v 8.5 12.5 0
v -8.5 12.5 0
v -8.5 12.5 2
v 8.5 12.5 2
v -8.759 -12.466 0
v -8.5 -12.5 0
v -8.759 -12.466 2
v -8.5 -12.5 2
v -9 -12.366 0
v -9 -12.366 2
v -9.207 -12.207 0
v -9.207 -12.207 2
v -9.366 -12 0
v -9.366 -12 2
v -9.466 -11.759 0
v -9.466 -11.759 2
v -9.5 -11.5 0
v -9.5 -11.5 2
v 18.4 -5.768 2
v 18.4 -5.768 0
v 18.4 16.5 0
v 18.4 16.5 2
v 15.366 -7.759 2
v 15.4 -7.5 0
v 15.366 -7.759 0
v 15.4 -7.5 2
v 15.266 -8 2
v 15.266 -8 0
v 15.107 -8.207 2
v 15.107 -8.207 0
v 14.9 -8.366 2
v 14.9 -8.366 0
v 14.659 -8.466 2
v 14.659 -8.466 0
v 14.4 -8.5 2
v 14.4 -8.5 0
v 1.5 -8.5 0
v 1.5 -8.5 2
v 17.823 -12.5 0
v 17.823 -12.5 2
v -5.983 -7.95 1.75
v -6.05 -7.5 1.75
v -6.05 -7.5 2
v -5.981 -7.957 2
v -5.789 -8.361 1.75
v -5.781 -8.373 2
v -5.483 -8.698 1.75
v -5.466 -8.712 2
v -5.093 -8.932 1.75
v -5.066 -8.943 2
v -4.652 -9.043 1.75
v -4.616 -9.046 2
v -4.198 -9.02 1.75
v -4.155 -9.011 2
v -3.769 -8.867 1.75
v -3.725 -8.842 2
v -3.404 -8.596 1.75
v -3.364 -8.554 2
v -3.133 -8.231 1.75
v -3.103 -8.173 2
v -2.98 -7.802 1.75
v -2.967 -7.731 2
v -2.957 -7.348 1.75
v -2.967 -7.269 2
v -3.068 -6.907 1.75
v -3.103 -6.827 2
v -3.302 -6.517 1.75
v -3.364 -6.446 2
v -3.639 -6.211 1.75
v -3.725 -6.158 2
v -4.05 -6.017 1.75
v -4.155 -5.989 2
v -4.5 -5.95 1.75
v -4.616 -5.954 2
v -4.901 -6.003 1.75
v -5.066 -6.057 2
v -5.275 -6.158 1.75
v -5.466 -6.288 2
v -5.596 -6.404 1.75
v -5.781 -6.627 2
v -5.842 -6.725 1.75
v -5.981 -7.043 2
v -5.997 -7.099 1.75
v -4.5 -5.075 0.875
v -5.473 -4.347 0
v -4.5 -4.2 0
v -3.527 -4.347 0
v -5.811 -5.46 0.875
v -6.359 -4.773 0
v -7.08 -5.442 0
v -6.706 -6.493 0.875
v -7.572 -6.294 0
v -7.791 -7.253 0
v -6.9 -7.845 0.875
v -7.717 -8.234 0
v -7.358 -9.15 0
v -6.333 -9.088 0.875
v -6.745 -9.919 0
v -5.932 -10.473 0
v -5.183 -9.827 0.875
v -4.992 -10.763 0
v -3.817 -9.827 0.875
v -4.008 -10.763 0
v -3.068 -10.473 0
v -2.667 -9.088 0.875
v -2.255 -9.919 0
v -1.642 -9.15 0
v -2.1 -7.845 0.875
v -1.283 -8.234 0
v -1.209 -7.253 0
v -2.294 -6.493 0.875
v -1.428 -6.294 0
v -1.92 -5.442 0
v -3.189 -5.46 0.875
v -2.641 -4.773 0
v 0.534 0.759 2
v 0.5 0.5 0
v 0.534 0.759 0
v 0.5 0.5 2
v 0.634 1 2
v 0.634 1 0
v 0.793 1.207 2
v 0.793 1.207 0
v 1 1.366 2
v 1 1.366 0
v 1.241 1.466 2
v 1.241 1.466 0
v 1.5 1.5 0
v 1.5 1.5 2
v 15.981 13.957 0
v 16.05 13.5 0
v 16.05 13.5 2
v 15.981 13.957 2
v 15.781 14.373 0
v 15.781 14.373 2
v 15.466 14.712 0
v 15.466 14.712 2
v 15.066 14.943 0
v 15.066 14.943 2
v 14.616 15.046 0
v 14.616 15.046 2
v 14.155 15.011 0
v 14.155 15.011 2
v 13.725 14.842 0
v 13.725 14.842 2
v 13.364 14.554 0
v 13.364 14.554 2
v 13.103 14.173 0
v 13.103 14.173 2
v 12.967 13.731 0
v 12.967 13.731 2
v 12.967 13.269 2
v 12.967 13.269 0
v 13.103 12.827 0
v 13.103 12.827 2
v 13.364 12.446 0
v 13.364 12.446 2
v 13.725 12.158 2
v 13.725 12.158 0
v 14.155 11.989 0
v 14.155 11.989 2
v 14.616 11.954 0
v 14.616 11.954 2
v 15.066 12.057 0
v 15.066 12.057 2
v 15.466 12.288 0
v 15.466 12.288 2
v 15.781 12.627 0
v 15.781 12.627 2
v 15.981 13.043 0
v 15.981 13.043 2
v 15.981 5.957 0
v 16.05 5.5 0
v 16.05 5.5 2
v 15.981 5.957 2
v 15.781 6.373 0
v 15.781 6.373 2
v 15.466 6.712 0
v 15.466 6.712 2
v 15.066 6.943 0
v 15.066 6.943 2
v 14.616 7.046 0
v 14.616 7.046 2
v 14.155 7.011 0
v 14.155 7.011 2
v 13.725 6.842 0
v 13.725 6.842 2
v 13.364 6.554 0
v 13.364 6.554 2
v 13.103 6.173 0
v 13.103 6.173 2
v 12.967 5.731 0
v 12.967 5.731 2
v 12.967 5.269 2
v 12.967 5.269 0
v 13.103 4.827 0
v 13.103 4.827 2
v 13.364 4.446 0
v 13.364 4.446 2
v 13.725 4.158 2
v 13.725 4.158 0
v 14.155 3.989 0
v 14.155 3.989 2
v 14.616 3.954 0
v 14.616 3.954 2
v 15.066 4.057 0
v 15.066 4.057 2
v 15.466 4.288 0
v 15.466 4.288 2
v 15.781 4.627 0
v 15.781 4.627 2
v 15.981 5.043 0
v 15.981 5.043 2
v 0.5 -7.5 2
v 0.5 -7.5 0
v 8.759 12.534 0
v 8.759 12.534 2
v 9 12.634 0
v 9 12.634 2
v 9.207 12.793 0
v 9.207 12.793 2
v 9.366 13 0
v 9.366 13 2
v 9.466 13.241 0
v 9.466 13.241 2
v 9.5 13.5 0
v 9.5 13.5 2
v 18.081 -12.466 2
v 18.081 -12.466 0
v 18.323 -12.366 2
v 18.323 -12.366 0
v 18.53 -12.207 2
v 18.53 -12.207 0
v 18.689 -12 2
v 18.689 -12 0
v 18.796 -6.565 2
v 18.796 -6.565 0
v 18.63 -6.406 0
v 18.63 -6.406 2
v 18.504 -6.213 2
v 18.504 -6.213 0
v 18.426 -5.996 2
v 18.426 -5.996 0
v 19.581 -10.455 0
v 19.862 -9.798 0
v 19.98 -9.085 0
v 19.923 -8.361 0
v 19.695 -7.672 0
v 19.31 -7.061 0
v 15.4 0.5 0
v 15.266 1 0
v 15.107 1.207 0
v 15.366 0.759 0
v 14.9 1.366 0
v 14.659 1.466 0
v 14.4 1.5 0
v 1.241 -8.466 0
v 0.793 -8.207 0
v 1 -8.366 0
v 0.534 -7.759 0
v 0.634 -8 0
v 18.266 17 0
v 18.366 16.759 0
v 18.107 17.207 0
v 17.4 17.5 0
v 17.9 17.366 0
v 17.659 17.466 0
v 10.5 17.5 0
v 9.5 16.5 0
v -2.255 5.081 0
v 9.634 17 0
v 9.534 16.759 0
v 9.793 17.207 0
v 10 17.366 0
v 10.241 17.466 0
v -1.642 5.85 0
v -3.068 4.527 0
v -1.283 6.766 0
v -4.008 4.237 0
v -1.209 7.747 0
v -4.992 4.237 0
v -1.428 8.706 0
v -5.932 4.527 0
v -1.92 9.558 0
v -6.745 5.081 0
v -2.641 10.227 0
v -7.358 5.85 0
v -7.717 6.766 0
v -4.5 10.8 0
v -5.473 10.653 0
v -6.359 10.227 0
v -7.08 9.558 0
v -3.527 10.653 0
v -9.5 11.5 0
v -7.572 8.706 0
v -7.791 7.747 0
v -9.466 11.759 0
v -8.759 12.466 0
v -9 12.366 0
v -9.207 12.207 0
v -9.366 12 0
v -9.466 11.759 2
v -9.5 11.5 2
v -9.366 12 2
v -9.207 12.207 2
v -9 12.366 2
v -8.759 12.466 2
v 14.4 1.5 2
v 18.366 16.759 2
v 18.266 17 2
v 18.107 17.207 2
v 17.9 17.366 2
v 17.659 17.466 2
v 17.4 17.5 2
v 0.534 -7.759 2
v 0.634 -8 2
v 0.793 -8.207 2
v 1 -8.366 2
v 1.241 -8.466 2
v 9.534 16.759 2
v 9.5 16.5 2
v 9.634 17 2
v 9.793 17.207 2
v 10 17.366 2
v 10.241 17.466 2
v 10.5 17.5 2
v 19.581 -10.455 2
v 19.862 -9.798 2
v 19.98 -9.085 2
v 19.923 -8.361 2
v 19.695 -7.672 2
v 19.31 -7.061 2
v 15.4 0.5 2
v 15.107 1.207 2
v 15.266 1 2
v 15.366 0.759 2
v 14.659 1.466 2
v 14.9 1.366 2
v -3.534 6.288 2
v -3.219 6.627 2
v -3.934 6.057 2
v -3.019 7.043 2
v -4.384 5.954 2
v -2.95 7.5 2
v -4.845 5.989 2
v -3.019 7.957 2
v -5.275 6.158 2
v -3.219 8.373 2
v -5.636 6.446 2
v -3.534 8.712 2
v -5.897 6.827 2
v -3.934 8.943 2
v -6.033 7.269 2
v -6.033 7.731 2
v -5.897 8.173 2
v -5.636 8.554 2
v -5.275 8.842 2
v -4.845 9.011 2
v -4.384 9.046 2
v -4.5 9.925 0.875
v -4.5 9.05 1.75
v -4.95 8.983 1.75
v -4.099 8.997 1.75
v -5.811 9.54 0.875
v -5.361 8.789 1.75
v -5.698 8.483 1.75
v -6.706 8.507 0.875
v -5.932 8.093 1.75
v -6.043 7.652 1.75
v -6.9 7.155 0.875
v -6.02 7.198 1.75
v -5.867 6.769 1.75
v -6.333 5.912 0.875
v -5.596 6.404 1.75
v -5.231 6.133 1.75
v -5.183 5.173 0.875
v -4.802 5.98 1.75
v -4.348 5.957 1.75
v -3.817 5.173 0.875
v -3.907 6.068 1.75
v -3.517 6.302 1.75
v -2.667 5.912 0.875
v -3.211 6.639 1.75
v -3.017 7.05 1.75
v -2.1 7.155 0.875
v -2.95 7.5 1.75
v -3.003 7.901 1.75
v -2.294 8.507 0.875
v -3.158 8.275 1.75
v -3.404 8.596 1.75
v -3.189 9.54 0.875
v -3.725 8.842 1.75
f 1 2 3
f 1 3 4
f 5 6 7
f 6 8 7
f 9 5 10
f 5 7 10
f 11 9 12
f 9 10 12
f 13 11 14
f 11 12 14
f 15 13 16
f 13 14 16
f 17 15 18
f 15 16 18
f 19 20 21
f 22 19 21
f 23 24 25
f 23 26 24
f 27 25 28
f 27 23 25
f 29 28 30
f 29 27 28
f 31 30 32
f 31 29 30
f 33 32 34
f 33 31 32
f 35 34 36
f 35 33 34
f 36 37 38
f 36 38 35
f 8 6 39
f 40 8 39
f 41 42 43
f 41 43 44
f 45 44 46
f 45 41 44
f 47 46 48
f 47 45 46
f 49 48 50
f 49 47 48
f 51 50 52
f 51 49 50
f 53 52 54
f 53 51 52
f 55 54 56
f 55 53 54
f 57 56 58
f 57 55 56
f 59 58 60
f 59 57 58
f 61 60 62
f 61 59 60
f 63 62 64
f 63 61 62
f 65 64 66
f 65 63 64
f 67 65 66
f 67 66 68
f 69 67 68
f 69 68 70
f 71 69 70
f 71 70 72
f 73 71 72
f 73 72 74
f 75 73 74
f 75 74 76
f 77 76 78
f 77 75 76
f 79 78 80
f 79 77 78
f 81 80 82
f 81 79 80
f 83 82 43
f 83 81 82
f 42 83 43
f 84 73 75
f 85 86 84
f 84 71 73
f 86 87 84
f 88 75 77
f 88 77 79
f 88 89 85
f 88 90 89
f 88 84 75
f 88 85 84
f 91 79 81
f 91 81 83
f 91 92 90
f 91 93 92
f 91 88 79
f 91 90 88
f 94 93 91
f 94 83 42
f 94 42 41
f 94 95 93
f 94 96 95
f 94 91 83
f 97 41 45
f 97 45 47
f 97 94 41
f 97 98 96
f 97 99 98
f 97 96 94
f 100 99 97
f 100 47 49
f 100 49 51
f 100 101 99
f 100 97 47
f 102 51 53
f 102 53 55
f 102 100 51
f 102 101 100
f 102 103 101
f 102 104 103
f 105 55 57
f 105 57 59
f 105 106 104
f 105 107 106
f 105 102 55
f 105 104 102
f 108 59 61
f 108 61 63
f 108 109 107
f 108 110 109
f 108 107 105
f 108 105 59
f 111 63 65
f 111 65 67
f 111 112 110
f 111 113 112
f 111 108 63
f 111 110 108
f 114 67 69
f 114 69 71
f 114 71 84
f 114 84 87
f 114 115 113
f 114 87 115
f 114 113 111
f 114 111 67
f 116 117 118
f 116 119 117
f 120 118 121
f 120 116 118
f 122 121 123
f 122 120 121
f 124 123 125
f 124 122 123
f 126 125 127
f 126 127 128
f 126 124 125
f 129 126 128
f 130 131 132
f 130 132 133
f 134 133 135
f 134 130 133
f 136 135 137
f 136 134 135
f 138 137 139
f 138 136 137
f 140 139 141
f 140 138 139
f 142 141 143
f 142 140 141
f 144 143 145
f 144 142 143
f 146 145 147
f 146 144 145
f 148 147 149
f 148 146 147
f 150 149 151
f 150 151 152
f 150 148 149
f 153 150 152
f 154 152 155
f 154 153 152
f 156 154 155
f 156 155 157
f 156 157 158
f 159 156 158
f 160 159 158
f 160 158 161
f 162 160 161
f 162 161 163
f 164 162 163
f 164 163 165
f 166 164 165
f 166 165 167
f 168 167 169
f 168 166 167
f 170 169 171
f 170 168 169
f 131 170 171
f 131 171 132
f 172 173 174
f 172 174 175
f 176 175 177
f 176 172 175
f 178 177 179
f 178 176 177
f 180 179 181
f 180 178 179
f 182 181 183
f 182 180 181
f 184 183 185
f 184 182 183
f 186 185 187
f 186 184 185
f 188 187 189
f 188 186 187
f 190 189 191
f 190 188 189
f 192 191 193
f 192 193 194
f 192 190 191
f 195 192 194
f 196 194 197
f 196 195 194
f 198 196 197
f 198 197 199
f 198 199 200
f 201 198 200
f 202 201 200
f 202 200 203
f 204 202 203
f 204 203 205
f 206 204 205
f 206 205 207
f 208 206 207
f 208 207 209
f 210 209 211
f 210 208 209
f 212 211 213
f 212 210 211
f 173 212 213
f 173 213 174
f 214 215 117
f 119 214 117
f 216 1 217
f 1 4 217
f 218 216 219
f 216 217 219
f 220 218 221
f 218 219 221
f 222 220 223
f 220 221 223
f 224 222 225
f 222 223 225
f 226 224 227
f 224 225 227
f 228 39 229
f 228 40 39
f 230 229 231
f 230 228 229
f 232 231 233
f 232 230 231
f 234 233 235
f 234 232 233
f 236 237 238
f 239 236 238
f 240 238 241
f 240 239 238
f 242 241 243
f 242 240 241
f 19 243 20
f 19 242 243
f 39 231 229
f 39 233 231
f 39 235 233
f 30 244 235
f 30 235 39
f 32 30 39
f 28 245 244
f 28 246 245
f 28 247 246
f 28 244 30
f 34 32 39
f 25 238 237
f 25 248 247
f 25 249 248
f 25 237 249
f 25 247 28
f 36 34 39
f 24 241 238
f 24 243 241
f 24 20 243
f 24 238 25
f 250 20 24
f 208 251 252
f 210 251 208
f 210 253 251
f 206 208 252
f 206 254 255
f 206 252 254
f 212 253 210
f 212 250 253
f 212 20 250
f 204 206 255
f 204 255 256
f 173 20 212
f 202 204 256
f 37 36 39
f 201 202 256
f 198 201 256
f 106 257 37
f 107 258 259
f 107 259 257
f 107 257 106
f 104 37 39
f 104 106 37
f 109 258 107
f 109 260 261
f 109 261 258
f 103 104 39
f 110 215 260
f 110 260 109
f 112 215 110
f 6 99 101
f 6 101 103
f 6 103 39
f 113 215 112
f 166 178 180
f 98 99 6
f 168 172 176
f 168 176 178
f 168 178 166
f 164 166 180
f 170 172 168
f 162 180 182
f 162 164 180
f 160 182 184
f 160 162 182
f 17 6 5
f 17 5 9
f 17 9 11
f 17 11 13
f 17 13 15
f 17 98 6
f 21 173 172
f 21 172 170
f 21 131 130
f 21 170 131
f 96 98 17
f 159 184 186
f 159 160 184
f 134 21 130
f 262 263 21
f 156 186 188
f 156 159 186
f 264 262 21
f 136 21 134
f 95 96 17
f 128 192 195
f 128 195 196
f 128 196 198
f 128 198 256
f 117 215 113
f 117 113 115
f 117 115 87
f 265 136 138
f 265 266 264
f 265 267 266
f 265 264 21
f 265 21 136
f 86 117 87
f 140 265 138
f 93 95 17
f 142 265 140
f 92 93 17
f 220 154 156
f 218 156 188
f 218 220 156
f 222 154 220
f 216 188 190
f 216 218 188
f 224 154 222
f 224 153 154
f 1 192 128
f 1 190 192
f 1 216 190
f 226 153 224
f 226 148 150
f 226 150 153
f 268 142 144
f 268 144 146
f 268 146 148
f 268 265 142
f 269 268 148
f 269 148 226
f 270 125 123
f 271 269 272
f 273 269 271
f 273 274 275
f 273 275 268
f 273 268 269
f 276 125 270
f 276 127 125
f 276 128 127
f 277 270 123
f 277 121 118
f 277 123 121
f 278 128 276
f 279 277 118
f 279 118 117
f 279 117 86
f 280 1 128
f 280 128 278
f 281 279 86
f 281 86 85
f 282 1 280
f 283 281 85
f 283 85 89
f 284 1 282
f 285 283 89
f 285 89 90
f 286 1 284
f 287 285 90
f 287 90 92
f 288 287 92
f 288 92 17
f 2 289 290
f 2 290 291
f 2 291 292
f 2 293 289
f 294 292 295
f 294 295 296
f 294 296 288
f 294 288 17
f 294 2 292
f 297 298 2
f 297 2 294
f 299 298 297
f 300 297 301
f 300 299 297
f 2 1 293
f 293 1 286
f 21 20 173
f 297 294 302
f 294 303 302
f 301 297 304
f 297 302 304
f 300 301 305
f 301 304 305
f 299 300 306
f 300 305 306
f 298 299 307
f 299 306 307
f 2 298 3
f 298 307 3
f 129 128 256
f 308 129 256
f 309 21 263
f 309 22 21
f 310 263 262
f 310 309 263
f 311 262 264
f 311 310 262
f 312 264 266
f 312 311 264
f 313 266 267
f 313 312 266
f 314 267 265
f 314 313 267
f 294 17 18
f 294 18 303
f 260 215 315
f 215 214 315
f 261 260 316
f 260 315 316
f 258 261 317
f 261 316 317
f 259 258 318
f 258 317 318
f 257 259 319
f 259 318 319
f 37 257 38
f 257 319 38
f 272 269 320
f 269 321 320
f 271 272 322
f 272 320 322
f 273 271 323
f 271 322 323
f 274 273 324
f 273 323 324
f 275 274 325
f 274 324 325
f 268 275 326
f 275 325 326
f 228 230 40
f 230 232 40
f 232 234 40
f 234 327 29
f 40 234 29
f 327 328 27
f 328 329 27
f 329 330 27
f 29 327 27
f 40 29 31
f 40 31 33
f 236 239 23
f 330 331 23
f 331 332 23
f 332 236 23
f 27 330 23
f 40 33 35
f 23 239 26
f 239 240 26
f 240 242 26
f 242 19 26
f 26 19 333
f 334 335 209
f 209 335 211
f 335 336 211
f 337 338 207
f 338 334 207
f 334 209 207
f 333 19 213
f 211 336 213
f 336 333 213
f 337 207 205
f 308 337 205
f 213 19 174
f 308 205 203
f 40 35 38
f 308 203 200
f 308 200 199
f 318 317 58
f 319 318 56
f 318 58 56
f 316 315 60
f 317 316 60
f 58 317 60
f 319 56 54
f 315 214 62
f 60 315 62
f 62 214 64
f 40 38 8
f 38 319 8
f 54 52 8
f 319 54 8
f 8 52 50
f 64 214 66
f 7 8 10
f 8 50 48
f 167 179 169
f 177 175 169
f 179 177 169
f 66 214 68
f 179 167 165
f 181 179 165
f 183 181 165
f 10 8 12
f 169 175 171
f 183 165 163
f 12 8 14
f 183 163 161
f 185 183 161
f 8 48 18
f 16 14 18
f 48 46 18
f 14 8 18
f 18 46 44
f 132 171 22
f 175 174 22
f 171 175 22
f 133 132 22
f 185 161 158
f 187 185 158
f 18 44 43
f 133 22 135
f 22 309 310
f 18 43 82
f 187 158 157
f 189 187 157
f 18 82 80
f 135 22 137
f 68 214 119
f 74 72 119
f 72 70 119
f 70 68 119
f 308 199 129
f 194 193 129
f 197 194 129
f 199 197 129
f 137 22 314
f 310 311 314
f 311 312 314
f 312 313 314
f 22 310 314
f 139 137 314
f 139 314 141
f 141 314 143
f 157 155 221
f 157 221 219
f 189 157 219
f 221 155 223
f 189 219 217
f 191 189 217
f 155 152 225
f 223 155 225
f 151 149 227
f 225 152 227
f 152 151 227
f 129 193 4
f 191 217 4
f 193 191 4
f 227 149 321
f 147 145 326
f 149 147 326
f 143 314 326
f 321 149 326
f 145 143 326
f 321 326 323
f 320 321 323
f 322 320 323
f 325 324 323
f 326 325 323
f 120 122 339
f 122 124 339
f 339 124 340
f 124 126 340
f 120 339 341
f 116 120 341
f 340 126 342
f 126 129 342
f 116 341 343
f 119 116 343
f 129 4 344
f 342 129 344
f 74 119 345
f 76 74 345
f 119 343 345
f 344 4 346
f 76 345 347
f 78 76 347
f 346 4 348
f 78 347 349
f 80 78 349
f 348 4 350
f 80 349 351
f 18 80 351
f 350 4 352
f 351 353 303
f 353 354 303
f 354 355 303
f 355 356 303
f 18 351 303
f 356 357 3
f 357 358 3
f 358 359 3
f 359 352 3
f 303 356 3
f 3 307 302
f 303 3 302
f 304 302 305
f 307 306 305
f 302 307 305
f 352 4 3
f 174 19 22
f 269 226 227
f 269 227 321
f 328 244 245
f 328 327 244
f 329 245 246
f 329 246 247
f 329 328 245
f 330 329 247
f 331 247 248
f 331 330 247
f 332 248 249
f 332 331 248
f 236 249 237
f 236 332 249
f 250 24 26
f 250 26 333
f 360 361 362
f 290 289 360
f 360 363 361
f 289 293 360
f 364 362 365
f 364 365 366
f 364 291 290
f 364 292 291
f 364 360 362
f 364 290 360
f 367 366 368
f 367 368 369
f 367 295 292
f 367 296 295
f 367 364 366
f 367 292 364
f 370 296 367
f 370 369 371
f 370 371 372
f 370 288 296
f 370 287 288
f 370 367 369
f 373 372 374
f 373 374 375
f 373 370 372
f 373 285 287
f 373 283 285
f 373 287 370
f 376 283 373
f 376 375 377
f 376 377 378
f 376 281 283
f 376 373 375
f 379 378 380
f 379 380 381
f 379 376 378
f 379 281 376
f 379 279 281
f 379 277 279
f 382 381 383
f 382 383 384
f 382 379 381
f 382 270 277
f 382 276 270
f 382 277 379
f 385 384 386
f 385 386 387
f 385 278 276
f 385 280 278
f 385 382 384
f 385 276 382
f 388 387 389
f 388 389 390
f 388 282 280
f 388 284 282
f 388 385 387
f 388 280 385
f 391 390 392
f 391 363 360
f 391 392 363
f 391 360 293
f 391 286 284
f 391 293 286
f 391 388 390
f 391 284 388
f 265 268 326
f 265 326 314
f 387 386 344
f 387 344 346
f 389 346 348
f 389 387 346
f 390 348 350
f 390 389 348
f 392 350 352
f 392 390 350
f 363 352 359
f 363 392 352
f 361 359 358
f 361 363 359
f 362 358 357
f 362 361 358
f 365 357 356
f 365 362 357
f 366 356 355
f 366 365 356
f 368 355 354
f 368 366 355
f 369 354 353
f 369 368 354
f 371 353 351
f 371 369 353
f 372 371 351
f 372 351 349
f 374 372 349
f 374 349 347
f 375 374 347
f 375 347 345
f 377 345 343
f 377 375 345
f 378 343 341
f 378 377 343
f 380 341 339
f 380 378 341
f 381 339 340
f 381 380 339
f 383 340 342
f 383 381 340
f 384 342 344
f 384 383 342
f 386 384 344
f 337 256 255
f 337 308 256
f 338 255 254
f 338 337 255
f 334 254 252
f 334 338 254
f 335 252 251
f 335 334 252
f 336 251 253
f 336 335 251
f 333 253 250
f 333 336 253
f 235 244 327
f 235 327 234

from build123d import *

# Parameters (mm, degrees)
SKETCH_1_R               = 1.55
SKETCH_1_W               = 14.9
SKETCH_1_H               = 10
EXTRUDE_1_DEPTH          = 2
FILLET_1_R               = 1
HOLE_WIZARD_1_AT_2_COUNT = 2
HOLE_WIZARD_1_AT_2_PITCH = 15
FILLET_2_R               = 3


with BuildPart() as part:
    # 草图1 → 凸台-拉伸1 (new body)
    with BuildSketch(Plane.XY):
        Polygon((9.5, -12.5), (-9.5, -12.5), (-9.5, 12.5), (9.5, 12.5), (9.5, 17.5), (18.4, 17.5), (18.4, 2.5), (18.4, -7.5), (22.730127019, -5), (18.4, -12.5), align=None)
        with Locations((14.5, 13.5)):
            Circle(SKETCH_1_R, mode=Mode.SUBTRACT)
        with Locations((14.5, 5.5)):
            Circle(SKETCH_1_R, mode=Mode.SUBTRACT)
        with Locations((-4.5, 7.5)):
            Circle(SKETCH_1_R, mode=Mode.SUBTRACT)
        with Locations(Location((-4.5, -7.5, 0), (0, 0, 180))):
            Circle(SKETCH_1_R, mode=Mode.SUBTRACT)
        with Locations((7.95, -3.5)):
            Rectangle(SKETCH_1_W, SKETCH_1_H, mode=Mode.SUBTRACT)
    extrude(amount=EXTRUDE_1_DEPTH)

    # 圆角1
    fillet_1_edges = [part.edges().sort_by_distance(p)[0] for p in [
        (-9.5, 12.5, 1),
        (9.5, 12.5, 1),
        (9.5, 17.5, 1),
        (18.4, 17.5, 1),
        (18.4, -7.5, 1),
        (18.4, -12.5, 1),
        (-9.5, -12.5, 1),
        (0.5, 1.5, 1),
        (0.5, -8.5, 1),
        (15.4, -8.5, 1),
        (15.4, 1.5, 1),
    ]]
    fillet(fillet_1_edges, radius=FILLET_1_R)

    # 草图2 → 打孔尺寸(%根据十字)槽沉头木螺钉的类型1 (revolve, cut)
    with BuildSketch(Plane(origin=(-4.5, 7.5, 0), x_dir=(0, 1, 0), z_dir=(1, 0, 0))):
        Polygon((0, 0), (0, 2), (1.55, 2), (1.55, 1.75), (3.3, 0), align=None)
    hole_wizard_1 = revolve(axis=Axis((-4.5, 7.5, -6.35), (0, 0, 1)), mode=Mode.SUBTRACT)

    # 打孔尺寸(%根据十字)槽沉头木螺钉的类型1 at 2: 打孔尺寸(%根据十字)槽沉头木螺钉的类型1 ×2
    with Locations(*[(0, -i * HOLE_WIZARD_1_AT_2_PITCH, 0) for i in range(1, HOLE_WIZARD_1_AT_2_COUNT)]):
        add(hole_wizard_1, mode=Mode.SUBTRACT)

    # 圆角2
    fillet_2_edges = [part.edges().sort_by_distance(p)[0] for p in [
        (22.730127019, -5, 1),
    ]]
    fillet(fillet_2_edges, radius=FILLET_2_R)


solid = part.part
